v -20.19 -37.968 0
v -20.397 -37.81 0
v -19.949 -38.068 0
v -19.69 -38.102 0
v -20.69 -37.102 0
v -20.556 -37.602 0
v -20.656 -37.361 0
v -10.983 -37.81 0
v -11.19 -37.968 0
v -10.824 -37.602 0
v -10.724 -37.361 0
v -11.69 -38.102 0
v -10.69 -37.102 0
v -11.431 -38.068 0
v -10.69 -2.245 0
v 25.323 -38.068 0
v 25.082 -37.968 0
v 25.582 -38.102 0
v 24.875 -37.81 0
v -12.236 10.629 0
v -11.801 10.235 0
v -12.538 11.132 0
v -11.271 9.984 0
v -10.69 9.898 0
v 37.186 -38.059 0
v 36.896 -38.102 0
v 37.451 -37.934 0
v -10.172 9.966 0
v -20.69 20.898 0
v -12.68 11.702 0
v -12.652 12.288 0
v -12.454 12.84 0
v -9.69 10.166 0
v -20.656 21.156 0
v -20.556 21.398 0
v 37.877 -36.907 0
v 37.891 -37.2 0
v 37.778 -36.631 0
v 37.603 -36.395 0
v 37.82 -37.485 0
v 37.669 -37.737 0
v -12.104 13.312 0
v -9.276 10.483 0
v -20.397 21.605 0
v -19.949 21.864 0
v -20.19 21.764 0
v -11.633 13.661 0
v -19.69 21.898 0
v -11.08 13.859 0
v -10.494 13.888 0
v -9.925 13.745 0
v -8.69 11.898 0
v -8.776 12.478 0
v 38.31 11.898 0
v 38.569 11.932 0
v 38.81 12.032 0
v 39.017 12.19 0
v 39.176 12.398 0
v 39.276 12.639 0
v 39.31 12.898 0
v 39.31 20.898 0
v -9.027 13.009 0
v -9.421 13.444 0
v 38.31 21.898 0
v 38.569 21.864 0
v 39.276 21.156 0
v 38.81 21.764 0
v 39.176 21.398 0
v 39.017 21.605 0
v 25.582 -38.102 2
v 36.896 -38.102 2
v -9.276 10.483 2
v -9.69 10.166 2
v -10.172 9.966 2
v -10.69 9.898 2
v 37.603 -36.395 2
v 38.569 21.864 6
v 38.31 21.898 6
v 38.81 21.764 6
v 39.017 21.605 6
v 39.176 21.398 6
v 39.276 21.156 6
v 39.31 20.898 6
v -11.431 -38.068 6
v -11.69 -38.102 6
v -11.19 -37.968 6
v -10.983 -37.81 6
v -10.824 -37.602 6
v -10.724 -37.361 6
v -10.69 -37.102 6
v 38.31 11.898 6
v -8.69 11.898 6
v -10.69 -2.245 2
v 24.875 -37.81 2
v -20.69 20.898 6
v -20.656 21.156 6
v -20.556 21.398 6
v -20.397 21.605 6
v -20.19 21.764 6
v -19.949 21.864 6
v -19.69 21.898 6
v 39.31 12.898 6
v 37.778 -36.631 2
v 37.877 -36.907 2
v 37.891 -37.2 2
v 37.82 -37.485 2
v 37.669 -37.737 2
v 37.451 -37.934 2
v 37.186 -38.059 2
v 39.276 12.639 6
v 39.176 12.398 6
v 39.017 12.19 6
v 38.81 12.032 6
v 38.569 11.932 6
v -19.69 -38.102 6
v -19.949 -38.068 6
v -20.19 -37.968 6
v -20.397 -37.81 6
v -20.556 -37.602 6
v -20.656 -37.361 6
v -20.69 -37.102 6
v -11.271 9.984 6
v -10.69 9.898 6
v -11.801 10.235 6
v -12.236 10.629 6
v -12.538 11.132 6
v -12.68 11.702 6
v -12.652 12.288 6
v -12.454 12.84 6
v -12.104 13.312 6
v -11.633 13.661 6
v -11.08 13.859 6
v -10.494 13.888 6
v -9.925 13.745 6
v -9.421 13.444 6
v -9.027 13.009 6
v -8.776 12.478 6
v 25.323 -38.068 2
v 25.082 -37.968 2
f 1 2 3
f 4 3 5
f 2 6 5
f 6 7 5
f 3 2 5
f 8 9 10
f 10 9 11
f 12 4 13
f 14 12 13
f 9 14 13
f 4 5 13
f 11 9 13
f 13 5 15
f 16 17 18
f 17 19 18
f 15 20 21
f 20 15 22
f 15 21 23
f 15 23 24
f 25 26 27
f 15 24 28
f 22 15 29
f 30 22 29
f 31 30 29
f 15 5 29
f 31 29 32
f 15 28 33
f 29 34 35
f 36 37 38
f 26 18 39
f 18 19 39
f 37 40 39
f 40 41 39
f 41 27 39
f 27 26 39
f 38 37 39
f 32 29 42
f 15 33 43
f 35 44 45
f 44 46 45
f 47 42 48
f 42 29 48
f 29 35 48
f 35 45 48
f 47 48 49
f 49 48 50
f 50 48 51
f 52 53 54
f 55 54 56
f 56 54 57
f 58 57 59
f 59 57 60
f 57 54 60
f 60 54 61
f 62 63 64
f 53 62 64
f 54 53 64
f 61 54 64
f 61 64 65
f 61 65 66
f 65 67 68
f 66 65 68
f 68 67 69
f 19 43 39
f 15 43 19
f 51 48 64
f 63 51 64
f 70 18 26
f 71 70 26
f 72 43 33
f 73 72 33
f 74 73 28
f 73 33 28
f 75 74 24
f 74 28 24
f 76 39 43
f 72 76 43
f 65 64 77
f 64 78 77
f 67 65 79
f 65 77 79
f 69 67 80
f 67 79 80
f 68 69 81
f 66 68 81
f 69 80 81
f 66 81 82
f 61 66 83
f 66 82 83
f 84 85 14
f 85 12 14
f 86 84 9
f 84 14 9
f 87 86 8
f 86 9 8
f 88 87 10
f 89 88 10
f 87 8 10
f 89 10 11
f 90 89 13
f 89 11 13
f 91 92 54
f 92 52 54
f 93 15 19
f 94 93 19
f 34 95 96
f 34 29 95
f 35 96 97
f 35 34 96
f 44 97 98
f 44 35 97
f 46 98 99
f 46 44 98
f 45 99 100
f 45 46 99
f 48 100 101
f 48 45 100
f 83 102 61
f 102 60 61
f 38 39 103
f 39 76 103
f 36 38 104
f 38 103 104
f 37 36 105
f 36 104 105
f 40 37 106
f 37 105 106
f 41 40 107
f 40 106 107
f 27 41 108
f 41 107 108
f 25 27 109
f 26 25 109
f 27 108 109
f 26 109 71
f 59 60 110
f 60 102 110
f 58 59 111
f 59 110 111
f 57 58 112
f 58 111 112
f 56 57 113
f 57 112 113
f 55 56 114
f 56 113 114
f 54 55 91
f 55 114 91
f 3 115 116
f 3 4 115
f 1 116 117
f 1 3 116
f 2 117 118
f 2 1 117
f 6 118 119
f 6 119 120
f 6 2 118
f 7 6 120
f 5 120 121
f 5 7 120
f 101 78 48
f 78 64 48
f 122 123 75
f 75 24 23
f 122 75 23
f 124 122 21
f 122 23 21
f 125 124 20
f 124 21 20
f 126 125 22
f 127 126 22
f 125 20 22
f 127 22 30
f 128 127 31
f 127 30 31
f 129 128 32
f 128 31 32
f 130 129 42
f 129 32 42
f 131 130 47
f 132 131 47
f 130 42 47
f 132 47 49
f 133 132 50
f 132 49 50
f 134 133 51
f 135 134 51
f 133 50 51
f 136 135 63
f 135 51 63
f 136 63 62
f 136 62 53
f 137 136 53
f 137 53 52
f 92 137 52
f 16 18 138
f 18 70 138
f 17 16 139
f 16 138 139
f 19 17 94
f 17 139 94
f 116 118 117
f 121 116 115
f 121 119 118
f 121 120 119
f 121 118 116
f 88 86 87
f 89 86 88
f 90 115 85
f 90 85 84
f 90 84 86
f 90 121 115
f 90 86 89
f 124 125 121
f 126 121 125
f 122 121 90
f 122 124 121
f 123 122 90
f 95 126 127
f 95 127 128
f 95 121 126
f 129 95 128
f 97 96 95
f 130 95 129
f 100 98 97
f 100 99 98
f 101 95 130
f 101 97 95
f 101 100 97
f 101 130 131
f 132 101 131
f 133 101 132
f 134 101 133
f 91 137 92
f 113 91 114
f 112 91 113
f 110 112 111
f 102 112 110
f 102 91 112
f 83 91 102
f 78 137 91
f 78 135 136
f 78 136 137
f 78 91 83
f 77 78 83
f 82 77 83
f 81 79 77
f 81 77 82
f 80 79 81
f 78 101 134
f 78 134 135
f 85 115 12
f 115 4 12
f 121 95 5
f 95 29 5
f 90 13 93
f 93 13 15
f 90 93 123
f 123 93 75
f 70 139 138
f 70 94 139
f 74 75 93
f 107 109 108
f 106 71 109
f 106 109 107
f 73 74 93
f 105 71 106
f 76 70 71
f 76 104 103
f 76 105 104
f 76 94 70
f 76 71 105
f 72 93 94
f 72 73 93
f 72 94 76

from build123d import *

# Parameters (mm, degrees)
F1_DEPTH = 2
F2_DEPTH = 6
F3_R     = 1


with BuildPart() as f1:
    # F0 (on Top) → F1 (new body)
    with BuildSketch(Plane.XY):
        with BuildLine():
            ThreePointArc((0, -2), (-1.414214, 1.414214), (2, 0))
            Line((2, 0), (50, 0))
            Line((50, 0), (50, 10))
            Line((50, 10), (-10, 10))
            Line((-10, 10), (-10, -50))
            Line((-10, -50), (0, -50))
            Line((0, -50), (0, -14.142136))
            Line((0, -14.142136), (0, -2))
        make_face()
        with BuildLine():
            ThreePointArc((1.414214, -1.414214), (0.765367, -1.847759), (0, -2))
            Line((0, -2), (0, -14.142136))
            Line((0, -14.142136), (35.857864, -50))
            Line((35.857864, -50), (50, -50))
            Line((50, -50), (1.414214, -1.414214))
        make_face()
    extrude(amount=F1_DEPTH)

    # F0 (on Top) → F2 (join)
    with BuildSketch(Plane.XY):
        with BuildLine():
            ThreePointArc((0, -2), (-1.414214, 1.414214), (2, 0))
            Line((2, 0), (50, 0))
            Line((50, 0), (50, 10))
            Line((50, 10), (-10, 10))
            Line((-10, 10), (-10, -50))
            Line((-10, -50), (0, -50))
            Line((0, -50), (0, -14.142136))
            Line((0, -14.142136), (0, -2))
        make_face()
    extrude(amount=F2_DEPTH)

    # F3
    f3_edges = [f1.edges().sort_by_distance(p)[0] for p in [
        (-10, -50, 3),
        (0, -50, 3),
        (35.857864, -50, 1),
        (50, 0, 3),
        (50, 10, 3),
        (-10, 10, 3),
        (50, -50, 1),
    ]]
    fillet(f3_edges, radius=F3_R)


with BuildPart() as f1_1:
    # F4: moved
    add(f1.part.moved(Location((-10.68996, 11.8976, 0))))


solid = f1_1.part
